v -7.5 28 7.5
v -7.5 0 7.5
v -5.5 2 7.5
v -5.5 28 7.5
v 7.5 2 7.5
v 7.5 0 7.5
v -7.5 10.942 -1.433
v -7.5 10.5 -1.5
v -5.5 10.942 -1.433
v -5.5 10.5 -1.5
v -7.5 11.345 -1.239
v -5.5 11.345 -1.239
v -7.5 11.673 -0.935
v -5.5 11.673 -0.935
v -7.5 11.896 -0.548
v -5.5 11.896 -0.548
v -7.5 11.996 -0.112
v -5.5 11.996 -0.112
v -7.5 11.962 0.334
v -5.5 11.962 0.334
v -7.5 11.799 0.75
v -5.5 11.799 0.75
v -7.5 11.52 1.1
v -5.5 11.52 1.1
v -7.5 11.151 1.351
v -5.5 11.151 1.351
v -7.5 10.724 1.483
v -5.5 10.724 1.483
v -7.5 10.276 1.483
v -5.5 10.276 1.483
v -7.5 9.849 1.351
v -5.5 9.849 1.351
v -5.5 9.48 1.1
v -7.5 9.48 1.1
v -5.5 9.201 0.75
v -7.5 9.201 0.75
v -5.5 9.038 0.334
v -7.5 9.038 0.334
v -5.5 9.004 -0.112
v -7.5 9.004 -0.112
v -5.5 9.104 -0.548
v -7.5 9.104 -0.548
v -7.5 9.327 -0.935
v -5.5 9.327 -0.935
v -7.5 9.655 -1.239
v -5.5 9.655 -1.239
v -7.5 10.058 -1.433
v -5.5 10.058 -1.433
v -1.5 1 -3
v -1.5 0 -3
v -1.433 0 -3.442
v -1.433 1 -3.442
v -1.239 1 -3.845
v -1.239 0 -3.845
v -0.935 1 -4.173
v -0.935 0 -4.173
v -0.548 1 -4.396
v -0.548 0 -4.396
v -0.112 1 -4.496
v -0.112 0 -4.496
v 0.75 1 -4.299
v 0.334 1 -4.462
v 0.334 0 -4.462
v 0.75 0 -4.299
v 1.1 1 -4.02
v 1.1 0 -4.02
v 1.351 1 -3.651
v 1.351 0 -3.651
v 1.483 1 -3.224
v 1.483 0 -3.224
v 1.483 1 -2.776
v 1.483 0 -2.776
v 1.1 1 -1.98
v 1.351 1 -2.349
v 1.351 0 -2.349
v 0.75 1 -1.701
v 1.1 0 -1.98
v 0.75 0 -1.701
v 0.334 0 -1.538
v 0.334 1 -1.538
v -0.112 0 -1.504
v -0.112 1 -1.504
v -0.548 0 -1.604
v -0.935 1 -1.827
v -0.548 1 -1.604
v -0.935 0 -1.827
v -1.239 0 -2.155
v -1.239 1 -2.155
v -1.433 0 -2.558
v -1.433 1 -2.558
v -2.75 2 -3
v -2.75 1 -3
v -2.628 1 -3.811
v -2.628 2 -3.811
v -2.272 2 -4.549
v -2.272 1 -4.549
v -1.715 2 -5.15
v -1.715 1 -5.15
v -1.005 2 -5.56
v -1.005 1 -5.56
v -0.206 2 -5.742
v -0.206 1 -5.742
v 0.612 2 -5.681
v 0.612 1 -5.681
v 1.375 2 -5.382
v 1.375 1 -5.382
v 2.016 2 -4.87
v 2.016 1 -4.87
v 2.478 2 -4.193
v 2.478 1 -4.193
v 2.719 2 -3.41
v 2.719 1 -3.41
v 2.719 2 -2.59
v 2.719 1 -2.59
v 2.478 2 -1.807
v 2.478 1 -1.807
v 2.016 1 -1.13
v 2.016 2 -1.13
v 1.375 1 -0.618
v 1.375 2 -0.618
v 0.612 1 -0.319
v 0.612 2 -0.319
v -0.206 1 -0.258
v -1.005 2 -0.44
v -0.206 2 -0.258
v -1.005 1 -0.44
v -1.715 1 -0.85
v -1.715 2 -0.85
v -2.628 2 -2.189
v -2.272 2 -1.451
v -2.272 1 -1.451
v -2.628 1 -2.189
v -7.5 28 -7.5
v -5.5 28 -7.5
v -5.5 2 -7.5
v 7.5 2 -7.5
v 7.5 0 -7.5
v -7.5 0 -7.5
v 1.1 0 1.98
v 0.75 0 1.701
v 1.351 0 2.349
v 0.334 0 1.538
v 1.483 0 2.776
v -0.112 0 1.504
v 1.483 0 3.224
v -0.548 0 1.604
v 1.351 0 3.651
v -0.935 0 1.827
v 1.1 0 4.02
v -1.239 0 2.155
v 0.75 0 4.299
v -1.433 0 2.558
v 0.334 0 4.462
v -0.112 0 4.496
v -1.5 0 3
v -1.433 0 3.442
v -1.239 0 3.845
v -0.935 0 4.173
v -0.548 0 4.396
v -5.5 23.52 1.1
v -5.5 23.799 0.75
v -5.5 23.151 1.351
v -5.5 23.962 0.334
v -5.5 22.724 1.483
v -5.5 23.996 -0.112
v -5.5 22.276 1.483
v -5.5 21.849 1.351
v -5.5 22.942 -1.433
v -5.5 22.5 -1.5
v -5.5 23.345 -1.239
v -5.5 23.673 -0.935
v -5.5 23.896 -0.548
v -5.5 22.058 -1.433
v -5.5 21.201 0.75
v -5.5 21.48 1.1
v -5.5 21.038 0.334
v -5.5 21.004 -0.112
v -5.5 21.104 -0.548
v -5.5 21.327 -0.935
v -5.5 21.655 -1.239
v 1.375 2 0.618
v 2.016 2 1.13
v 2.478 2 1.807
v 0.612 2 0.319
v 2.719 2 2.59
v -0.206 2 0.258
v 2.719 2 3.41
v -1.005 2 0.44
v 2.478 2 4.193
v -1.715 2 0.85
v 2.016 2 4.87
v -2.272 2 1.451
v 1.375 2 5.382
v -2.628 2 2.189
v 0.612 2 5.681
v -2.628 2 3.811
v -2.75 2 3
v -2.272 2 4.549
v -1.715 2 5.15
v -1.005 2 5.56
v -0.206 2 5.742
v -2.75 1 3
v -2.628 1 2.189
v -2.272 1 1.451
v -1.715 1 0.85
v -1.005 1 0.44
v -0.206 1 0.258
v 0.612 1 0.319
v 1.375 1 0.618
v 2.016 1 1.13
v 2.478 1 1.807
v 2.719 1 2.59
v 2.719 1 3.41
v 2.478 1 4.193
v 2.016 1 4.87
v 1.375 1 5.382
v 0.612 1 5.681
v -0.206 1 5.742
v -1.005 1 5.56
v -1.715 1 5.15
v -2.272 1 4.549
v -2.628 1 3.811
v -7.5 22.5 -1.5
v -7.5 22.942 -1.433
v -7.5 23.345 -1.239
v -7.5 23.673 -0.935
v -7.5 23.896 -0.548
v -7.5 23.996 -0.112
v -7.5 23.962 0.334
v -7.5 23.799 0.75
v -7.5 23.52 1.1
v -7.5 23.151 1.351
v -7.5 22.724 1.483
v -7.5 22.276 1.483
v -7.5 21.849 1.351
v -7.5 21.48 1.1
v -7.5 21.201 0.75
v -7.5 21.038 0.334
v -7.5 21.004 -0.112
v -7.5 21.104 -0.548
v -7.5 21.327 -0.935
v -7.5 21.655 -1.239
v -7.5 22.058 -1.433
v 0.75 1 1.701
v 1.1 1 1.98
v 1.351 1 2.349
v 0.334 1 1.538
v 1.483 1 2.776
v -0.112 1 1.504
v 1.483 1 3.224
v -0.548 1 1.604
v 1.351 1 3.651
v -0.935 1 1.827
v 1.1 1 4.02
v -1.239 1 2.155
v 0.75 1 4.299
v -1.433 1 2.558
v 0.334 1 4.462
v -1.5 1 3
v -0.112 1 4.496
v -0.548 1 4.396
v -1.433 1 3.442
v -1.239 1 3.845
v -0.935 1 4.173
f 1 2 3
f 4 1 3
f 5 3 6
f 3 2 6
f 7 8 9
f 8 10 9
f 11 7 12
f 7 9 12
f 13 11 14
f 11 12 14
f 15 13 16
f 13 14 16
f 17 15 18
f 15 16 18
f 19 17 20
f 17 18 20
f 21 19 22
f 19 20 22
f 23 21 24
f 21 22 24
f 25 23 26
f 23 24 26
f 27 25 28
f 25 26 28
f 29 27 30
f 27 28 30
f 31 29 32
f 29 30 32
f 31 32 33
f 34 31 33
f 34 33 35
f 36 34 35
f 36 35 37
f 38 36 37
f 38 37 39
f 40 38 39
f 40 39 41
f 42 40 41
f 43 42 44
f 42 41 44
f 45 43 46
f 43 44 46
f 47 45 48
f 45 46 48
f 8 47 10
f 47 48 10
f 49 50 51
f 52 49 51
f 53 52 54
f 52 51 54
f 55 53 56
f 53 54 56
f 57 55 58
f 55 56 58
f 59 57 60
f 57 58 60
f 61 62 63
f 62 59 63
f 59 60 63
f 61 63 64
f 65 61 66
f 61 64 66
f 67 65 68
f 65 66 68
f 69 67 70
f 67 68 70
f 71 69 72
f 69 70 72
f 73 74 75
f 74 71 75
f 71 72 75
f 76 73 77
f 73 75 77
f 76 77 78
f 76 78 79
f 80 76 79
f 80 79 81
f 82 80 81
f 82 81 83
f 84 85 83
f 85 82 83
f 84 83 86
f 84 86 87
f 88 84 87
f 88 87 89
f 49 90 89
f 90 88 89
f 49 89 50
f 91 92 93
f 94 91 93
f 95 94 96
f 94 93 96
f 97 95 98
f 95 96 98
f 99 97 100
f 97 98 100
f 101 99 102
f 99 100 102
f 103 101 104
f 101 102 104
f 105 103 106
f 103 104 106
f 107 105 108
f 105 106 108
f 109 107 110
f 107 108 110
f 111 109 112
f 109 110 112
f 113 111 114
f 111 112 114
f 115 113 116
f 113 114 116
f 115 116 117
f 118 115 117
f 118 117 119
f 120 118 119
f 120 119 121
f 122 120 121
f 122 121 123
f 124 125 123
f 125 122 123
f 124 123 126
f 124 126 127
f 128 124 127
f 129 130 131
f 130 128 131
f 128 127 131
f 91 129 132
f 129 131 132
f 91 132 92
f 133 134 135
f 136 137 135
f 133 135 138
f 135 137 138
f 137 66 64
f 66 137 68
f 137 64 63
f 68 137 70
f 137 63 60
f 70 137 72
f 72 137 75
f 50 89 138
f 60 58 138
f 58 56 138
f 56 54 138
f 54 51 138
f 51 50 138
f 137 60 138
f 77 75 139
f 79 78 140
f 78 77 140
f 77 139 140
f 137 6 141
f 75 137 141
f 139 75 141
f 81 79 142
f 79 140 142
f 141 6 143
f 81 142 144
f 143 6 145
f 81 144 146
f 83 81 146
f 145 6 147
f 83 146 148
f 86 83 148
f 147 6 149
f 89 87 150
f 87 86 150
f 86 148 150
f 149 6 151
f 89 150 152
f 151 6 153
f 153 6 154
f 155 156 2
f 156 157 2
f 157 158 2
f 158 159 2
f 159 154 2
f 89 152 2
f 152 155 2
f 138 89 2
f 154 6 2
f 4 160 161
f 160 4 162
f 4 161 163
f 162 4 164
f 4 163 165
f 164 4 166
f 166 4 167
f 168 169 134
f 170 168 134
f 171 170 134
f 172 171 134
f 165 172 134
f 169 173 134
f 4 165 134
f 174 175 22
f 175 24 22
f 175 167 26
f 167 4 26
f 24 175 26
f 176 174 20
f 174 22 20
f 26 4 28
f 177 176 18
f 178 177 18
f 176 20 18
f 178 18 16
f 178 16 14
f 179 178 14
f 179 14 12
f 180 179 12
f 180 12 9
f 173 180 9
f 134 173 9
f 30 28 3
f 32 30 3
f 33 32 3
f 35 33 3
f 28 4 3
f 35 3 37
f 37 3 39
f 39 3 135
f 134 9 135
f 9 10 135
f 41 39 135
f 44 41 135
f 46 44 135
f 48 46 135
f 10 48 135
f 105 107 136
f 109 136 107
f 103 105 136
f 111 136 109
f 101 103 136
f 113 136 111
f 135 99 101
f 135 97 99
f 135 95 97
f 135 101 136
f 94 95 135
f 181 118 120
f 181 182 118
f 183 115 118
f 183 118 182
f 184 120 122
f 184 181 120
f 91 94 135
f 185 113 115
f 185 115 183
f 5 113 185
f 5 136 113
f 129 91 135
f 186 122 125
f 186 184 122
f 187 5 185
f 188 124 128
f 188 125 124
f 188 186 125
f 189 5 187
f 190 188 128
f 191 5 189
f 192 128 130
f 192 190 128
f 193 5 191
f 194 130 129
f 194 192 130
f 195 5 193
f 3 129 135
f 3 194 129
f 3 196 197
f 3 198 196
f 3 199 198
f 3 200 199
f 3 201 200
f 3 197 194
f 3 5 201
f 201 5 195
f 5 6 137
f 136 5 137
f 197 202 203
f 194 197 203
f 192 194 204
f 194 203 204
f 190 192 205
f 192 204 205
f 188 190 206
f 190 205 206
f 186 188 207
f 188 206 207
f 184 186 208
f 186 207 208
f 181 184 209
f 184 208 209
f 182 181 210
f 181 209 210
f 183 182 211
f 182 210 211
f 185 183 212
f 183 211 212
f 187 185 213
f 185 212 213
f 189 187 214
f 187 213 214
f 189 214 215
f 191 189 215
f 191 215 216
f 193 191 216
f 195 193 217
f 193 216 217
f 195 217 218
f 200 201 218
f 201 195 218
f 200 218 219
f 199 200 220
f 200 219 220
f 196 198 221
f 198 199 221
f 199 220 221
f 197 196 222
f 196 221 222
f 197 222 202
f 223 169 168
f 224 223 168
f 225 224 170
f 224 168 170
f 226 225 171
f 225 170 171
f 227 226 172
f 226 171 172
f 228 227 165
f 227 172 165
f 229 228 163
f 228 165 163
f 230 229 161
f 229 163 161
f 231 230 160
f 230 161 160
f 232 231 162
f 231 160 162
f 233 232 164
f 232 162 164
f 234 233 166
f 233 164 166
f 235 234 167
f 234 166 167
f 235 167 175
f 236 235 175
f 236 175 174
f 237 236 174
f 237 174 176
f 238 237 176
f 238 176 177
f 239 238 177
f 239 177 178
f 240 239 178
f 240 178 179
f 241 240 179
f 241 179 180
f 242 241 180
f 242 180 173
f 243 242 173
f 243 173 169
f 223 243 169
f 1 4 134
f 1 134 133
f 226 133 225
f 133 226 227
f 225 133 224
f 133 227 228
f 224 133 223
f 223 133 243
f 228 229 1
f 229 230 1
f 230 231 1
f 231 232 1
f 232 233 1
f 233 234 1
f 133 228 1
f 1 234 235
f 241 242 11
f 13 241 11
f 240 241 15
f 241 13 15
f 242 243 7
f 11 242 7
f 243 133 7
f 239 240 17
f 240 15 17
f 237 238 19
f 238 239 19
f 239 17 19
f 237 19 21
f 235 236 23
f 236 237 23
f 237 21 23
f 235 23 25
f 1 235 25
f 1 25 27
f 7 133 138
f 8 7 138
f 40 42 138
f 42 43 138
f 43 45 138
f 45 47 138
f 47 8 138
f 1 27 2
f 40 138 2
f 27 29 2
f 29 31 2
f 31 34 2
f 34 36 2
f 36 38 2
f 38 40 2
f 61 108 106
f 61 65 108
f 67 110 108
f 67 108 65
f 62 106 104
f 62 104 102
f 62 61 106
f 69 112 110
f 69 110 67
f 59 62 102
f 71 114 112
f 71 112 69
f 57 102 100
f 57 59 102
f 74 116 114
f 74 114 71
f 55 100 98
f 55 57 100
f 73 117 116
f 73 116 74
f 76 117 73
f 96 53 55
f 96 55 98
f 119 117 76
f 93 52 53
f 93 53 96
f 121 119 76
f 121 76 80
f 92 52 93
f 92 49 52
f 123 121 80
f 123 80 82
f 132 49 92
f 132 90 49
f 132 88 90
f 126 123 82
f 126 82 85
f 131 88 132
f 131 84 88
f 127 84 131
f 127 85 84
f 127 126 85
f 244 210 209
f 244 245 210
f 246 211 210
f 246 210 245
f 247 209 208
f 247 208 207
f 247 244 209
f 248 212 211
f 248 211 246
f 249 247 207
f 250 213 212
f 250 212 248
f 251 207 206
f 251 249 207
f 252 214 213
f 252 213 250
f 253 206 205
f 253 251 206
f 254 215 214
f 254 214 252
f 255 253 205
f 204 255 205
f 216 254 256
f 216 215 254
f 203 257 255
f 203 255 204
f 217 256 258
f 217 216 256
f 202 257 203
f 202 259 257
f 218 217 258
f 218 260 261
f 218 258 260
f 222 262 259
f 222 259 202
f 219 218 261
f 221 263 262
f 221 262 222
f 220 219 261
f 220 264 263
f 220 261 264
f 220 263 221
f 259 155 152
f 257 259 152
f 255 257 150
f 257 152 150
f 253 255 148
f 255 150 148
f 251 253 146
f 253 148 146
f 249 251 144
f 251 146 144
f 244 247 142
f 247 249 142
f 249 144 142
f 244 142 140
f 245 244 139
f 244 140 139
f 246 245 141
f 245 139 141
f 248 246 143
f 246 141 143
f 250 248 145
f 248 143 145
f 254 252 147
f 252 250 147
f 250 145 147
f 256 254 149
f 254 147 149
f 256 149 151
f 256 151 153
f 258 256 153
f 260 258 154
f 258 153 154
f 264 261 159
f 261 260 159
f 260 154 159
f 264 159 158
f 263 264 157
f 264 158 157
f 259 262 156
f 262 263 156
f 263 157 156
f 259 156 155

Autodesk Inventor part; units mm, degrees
ref_plane "YZ Plane" through (0, 0, 0) normal (1, 0, 0) x (0, 1, 0)
ref_plane "XZ Plane" through (0, 0, 0) normal (0, 1, 0) x (-1, 0, 0)
ref_plane "XY Plane" through (0, 0, 0) normal (0, 0, 1) x (1, 0, 0)
sketch "Sketch1" plane through (0, 0, 0) normal (0, 1, 0) x (-1, 0, 0)
  line L0 (7.5, 7.5) -> (-7.5, 7.5)
  line L1 (-7.5, 7.5) -> (-7.5, -7.5)
  line L2 (-7.5, -7.5) -> (7.5, -7.5)
  line L3 (7.5, -7.5) -> (7.5, 7.5)
  line L4 (7.5, 7.5) -> (-7.5, -7.5) construction
  line L5 (-7.5, 7.5) -> (7.5, -7.5) construction
  line L6 (7.5, 7.5) -> (5.5, 7.5)
  line L7 (5.5, 7.5) -> (5.5, -7.5)
  line L8 (5.5, -7.5) -> (7.5, -7.5)
  line L9 (7.5, -7.5) -> (7.5, 7.5)
  circle A0 centre (0, 3) radius 1.5
  circle A1 centre (0, 3) radius 2.75
  line L10 (7.5, 0) -> (-7.5, 0) construction
  line L11 (0, 7.5) -> (0, -7.5) construction
  circle A2 centre (0, -3) radius 1.5
  circle A3 centre (0, -3) radius 2.75
  point P0 (0, 0)
  dimension "d0" = 15
  dimension "d1" = 15
  dimension "d2" = 2
  dimension "d3" = 3
  dimension "d4" = 5.5
  dimension "d5" = 4.5
extrude "Extrusion1" add sketch "Sketch1" along normal blind 2 contours L7 L2 L1 L0
extrude "Extrusion2" add sketch "Sketch1" along normal blind 1 contours A1 | A3
extrude "Extrusion3" add sketch "Sketch1" along normal blind 28 contours L3 L2 L7 L0
sketch "Sketch2" plane through (-5.5, 2, -7.5) normal (1, 0, 0) x (0, 0, -1)
  circle A0 centre (-7.5, 8.5) radius 1.5
  line L0 (-15, 0) -> (0, 0) projected
  circle A1 centre (-7.5, 20.5) radius 1.5
  point P0 (-7.5, -2)
  dimension "d12" = 3
  dimension "d13" = 8.5
  dimension "d14" = 3
  dimension "d15" = 20.5
extrude "Extrusion4" cut sketch "Sketch2" against normal blind 2
properties part number "Konektor Lifter 2_3DPrint"
